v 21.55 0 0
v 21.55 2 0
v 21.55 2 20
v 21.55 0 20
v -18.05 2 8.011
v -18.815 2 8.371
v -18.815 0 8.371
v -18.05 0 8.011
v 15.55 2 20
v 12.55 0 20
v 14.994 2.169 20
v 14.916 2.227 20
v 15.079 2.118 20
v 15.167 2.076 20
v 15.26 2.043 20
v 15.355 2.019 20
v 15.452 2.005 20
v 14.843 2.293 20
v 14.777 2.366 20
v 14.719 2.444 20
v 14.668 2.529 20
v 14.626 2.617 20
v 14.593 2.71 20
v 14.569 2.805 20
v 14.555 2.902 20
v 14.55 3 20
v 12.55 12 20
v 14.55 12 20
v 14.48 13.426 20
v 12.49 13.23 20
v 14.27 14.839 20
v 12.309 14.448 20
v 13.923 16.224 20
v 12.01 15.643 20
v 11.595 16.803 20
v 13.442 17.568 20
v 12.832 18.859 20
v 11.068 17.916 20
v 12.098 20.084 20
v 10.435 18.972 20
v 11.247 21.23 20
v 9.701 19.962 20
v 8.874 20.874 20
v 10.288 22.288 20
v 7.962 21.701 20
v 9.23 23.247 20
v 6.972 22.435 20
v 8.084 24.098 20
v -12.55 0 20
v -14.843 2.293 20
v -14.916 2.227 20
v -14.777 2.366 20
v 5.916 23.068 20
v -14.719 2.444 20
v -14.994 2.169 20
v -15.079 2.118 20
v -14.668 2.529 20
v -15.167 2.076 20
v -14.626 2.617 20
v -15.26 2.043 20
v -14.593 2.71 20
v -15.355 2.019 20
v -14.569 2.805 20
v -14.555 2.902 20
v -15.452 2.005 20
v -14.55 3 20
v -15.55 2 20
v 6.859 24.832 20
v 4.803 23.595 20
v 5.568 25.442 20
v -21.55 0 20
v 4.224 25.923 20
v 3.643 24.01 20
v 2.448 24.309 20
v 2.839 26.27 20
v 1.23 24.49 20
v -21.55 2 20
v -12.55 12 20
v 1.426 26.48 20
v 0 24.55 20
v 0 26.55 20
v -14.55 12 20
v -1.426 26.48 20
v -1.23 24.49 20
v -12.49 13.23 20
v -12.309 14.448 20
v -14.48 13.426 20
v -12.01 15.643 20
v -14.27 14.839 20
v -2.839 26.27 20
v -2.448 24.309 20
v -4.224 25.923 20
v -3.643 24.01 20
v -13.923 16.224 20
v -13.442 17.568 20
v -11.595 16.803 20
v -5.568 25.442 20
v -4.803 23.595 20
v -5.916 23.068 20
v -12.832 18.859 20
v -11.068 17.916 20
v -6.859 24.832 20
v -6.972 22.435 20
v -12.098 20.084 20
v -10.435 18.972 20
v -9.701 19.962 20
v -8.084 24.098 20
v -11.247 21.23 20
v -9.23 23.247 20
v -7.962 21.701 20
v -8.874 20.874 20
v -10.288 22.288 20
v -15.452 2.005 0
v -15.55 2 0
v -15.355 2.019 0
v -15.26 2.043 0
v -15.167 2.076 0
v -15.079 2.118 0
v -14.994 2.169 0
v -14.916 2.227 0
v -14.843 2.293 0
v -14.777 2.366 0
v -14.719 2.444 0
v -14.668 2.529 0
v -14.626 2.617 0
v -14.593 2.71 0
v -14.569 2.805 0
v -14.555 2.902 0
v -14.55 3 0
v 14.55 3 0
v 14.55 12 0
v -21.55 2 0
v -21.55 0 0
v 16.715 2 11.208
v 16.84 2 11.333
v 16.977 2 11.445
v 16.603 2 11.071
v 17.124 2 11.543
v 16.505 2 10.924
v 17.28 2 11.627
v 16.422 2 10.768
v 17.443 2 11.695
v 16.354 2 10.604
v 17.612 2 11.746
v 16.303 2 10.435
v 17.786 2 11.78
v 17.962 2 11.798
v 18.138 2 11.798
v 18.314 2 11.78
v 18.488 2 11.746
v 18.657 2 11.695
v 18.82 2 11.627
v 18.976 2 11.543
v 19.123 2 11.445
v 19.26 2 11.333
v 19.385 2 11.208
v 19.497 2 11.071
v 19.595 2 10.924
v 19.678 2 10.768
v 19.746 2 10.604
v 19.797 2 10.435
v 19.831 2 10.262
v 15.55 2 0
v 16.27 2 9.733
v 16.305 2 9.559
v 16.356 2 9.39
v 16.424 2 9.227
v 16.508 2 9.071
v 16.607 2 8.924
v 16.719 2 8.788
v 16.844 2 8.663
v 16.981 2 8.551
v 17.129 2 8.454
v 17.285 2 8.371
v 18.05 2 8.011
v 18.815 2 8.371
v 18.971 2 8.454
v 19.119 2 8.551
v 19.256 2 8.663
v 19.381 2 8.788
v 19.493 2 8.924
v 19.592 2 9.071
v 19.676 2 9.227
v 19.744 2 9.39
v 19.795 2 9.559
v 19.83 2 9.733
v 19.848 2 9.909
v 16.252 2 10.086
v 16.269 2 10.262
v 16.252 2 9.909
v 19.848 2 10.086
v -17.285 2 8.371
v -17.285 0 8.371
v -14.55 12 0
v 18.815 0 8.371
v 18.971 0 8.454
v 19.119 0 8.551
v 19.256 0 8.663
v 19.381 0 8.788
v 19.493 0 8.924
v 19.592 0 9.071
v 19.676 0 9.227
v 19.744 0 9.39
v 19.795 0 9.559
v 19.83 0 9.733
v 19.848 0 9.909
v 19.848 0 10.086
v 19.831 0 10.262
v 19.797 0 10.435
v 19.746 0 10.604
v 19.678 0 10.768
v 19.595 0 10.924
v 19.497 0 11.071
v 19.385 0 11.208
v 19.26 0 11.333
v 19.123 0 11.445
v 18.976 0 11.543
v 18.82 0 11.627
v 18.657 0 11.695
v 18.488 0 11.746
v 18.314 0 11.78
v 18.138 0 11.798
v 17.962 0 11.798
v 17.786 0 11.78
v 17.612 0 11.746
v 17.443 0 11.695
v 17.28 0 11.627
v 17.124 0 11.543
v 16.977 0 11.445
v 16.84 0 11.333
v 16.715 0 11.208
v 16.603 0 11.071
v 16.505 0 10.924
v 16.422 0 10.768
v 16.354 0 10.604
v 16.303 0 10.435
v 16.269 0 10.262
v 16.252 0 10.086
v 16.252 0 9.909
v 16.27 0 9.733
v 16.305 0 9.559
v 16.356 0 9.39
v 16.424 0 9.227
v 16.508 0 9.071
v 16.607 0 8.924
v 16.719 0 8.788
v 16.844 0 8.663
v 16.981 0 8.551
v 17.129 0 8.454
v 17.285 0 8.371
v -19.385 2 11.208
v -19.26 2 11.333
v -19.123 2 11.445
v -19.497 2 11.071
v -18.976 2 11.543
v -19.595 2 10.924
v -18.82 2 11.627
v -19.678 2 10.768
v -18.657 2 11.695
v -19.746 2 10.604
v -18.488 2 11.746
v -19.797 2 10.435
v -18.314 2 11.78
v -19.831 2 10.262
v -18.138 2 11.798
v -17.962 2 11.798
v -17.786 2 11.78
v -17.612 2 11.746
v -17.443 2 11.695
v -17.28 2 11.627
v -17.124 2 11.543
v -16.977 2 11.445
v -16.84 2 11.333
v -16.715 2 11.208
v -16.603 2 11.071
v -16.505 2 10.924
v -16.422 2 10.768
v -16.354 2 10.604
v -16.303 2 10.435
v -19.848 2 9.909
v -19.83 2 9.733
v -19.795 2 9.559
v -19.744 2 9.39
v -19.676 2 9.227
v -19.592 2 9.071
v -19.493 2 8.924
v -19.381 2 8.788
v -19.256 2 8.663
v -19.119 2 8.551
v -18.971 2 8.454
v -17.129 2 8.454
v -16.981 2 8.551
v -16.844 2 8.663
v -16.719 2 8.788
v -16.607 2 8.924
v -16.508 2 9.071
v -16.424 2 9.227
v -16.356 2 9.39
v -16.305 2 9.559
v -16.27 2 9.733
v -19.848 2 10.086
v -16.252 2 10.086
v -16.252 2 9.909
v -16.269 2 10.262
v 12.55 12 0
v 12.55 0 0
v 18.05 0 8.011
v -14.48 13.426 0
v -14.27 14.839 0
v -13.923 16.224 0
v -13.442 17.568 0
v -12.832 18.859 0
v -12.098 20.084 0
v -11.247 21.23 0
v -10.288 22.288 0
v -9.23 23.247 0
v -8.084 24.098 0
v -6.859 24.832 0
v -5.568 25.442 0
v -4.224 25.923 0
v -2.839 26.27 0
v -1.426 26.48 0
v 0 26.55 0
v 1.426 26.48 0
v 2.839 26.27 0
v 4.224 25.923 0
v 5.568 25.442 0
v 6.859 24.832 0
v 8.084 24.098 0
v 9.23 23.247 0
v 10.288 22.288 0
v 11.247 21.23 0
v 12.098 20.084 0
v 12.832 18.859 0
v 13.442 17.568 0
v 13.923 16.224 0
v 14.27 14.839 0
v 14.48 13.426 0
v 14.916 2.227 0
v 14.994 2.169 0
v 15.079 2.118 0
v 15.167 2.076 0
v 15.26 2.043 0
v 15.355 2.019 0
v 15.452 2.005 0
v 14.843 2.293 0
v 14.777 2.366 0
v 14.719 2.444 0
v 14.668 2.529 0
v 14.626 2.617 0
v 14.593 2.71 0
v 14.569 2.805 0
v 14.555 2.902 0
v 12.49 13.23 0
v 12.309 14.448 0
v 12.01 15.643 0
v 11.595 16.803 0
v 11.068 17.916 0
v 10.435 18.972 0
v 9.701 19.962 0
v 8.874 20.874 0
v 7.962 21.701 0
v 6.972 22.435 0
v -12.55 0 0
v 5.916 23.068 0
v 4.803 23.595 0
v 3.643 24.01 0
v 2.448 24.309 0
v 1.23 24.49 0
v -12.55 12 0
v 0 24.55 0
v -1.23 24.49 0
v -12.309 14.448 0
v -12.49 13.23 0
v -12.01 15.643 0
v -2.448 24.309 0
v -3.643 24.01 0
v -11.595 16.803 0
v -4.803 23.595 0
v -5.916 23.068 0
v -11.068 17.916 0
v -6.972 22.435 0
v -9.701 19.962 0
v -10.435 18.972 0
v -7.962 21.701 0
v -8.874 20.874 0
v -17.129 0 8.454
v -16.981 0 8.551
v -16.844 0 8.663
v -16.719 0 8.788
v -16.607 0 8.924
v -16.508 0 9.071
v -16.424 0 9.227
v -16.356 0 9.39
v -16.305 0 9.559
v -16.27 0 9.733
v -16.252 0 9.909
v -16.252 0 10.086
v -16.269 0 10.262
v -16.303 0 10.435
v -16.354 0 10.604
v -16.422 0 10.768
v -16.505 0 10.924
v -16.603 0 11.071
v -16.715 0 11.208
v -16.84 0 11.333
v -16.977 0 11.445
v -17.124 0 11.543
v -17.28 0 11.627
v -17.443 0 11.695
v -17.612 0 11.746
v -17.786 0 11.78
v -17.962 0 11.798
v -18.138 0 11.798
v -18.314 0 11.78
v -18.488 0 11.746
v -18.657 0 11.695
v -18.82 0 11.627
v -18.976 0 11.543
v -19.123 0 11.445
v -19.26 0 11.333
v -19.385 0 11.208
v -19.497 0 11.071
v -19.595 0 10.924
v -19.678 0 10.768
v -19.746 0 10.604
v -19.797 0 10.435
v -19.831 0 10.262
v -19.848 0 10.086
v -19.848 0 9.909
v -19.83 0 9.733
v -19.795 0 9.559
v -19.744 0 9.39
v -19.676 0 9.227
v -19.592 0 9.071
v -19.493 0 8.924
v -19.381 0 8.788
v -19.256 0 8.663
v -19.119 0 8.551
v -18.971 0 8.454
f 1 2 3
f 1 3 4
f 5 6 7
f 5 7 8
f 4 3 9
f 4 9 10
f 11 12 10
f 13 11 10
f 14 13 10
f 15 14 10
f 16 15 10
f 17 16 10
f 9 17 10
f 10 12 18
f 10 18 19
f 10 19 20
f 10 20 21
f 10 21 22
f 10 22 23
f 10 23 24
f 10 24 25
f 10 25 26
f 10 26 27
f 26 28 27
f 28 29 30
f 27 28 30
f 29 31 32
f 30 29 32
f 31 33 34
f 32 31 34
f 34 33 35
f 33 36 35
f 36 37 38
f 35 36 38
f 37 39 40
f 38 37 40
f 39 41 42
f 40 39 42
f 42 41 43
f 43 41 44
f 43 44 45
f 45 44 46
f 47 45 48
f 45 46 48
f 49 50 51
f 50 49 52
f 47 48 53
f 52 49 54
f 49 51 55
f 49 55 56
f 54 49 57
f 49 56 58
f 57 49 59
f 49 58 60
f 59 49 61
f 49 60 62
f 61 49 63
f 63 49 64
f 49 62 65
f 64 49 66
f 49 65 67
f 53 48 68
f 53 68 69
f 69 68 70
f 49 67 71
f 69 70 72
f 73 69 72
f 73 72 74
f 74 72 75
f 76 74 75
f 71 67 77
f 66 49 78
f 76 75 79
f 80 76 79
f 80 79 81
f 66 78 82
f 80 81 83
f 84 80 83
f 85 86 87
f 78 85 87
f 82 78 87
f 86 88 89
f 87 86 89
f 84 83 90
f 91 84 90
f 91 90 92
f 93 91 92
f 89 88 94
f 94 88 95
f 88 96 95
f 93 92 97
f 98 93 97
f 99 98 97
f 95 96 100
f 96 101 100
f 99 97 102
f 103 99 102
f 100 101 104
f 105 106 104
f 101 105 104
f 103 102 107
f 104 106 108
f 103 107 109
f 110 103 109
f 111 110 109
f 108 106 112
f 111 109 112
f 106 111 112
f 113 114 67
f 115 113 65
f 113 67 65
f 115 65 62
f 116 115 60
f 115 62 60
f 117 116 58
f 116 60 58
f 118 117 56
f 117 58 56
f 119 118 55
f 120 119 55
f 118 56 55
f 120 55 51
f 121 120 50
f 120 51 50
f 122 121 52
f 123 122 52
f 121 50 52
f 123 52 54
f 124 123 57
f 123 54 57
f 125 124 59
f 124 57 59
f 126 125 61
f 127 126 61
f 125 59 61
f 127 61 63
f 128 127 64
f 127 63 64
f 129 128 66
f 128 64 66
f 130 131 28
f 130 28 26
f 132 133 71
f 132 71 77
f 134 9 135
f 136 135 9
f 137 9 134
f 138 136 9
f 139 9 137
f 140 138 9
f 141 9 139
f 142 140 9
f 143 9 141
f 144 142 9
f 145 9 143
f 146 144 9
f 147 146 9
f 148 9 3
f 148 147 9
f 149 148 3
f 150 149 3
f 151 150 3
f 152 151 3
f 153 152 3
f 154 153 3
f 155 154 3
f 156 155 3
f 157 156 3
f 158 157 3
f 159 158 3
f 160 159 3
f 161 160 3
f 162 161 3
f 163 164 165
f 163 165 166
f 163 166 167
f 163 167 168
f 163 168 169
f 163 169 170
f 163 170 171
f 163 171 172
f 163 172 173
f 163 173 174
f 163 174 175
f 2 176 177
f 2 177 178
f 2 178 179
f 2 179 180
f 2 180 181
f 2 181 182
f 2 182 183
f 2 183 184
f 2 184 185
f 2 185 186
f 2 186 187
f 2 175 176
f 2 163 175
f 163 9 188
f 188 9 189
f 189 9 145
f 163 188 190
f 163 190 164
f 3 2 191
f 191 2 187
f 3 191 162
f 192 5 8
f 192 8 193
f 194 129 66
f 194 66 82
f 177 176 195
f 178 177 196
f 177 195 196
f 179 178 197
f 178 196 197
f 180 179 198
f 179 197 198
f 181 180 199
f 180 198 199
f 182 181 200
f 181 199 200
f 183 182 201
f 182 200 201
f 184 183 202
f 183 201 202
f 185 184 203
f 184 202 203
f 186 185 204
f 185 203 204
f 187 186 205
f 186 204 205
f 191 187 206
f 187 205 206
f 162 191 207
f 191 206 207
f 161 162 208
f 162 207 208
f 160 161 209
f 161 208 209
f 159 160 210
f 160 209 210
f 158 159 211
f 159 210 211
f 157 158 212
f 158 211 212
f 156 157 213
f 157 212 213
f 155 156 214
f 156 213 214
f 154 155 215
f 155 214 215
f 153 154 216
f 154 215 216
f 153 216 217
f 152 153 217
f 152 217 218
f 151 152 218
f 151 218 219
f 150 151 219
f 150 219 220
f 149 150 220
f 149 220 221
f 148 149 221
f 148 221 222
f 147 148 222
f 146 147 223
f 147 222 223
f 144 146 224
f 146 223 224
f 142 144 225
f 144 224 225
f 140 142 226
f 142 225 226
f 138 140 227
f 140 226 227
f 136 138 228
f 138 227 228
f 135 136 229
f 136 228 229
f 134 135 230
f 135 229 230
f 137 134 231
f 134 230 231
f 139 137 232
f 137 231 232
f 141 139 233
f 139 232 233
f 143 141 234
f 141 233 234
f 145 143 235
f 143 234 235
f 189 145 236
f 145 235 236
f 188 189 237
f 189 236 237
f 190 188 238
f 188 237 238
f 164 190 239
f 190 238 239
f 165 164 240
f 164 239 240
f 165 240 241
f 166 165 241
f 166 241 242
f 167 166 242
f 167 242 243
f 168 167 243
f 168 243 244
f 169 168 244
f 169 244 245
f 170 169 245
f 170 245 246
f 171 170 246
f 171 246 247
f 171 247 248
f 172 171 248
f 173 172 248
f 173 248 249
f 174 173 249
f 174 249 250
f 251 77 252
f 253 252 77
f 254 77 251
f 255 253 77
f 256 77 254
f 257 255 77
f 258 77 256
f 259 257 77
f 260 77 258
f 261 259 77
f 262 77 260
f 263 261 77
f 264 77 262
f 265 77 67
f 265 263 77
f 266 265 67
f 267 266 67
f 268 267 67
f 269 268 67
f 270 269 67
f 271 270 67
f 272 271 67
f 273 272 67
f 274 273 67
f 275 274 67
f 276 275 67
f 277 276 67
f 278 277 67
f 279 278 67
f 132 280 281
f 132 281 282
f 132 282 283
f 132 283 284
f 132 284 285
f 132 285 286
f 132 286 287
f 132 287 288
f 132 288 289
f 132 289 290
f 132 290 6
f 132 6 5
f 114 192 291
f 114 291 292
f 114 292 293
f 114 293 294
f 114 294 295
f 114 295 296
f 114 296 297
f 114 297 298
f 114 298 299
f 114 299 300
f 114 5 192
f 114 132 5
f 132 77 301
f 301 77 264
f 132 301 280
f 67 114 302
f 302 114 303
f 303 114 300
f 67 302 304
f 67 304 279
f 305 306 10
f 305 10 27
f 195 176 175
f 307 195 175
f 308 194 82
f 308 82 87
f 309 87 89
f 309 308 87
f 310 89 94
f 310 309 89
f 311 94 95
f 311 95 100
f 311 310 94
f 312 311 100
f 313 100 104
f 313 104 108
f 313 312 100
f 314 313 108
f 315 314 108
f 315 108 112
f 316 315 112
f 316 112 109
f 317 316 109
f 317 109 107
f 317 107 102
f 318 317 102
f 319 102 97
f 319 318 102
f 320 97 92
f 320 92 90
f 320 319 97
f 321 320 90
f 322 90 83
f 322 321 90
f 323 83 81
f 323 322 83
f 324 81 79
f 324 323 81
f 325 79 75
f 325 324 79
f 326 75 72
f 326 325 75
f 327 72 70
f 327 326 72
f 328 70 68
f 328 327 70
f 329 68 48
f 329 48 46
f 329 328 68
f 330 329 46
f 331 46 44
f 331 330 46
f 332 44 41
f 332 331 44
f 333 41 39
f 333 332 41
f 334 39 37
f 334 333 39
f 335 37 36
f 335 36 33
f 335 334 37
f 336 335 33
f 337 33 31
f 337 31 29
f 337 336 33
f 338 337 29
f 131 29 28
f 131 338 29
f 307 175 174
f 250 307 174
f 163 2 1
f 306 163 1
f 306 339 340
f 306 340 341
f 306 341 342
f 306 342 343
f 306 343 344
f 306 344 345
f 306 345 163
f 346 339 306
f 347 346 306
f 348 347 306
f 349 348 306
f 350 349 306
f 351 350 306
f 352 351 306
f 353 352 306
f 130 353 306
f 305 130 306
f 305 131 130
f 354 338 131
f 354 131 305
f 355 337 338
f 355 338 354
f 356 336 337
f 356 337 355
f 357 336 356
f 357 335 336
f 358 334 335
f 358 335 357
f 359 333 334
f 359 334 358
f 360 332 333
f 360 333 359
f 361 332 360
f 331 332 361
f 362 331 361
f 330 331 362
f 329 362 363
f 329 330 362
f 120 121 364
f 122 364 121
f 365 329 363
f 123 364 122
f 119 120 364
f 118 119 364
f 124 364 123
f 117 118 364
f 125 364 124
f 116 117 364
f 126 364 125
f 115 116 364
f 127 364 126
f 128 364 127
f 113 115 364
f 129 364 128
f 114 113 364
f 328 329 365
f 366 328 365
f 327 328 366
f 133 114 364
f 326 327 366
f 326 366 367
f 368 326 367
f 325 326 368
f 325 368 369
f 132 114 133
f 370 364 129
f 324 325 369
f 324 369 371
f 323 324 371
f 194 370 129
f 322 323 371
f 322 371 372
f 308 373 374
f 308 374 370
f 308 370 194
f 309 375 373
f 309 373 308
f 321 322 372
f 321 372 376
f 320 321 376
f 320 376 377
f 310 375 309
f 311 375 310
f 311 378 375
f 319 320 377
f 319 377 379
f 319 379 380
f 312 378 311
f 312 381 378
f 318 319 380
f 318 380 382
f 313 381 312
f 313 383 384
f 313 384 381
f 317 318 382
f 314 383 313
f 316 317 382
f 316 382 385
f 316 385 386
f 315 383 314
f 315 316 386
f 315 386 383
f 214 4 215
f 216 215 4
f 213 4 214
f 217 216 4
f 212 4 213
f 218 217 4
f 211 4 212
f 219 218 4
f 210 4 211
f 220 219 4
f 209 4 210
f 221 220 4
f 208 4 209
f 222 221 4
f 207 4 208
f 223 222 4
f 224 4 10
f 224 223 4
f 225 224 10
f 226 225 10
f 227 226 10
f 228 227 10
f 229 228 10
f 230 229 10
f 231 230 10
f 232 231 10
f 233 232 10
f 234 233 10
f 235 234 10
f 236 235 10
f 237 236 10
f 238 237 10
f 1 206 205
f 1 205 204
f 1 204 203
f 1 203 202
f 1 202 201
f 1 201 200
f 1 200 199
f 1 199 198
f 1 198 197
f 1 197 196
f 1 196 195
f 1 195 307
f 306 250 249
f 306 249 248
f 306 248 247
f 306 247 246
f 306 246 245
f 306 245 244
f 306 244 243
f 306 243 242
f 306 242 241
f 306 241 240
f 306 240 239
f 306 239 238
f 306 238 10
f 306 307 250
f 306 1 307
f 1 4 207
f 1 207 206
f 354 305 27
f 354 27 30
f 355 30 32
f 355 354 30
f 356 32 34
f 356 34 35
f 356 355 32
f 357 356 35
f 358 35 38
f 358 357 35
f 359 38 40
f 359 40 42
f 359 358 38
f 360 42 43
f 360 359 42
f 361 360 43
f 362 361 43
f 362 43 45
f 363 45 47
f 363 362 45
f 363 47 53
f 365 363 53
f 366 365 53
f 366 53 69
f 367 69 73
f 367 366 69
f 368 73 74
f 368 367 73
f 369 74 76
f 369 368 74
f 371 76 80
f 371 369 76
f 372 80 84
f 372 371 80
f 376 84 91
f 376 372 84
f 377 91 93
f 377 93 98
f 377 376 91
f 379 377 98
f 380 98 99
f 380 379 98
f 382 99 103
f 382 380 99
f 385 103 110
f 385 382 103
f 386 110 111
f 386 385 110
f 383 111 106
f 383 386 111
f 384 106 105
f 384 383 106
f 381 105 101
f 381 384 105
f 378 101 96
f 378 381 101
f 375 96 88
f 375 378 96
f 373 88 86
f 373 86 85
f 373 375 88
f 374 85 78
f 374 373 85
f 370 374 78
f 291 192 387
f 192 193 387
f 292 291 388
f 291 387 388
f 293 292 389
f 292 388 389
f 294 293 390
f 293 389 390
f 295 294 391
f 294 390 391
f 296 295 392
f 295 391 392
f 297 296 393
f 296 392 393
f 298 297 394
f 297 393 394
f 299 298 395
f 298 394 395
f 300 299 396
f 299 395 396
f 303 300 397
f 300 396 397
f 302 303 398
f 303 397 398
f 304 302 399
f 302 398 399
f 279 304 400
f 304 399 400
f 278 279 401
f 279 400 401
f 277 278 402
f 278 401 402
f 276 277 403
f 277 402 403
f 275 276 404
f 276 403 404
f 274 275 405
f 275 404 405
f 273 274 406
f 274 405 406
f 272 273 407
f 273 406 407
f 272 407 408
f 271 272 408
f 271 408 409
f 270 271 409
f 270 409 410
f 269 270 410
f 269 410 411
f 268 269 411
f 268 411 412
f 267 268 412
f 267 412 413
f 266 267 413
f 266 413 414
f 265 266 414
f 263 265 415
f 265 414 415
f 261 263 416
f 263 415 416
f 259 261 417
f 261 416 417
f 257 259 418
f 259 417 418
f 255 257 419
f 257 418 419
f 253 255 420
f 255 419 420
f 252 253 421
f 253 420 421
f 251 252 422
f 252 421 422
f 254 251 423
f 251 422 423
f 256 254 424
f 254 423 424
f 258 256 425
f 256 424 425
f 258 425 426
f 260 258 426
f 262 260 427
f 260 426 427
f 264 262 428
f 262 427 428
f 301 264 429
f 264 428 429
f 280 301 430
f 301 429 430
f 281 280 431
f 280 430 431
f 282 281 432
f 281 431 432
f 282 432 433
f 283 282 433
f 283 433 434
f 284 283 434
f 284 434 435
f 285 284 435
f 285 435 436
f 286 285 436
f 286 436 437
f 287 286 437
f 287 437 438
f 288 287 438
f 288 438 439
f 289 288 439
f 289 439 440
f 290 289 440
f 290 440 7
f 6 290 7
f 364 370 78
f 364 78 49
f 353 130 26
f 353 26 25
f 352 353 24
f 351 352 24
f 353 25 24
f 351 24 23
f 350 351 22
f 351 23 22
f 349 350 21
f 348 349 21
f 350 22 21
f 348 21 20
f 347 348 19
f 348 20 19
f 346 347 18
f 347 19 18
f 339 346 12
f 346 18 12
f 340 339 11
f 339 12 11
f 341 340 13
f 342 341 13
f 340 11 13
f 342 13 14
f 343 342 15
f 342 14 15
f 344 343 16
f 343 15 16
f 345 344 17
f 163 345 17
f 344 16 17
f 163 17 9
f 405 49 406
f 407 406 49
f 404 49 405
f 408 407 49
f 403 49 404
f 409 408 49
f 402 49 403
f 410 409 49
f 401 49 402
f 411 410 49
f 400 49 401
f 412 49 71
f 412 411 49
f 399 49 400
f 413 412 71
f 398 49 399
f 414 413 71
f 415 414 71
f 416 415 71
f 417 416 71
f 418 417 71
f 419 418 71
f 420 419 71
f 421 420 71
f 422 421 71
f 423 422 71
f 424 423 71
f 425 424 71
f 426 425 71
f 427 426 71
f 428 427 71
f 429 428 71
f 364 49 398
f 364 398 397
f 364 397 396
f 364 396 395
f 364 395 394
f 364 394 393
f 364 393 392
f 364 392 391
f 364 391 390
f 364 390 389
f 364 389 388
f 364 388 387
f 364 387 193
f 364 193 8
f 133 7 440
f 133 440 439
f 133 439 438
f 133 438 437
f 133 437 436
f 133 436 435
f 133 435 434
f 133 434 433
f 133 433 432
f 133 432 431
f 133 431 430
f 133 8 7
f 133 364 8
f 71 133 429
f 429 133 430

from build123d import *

# Parameters (mm, degrees)
SALIENTE_EXTRUIR1_DEPTH      = 20
TALADRO_DE_MARGEN_PARA_M31_D = 3.6
REDONDEO1_R                  = 1
CORTAR_EXTRUIR1_REACH        = 40.303


with BuildPart() as part:
    # Croquis1 → Saliente-Extruir1 (new body)
    with BuildSketch(Plane.XY):
        with BuildLine():
            Line((-12.55, 0), (-21.55, 0))
            Line((-21.55, 0), (-21.55, 2))
            Line((-21.55, 2), (-14.55, 2))
            Line((-14.55, 2), (-14.55, 12))
            ThreePointArc((-14.55, 12), (0, 26.55), (14.55, 12))
            Line((14.55, 12), (14.55, 2))
            Line((14.55, 2), (21.55, 2))
            Line((21.55, 2), (21.55, 0))
            Line((21.55, 0), (12.55, 0))
            Line((12.55, 0), (12.55, 12))
            ThreePointArc((12.55, 12), (0, 24.55), (-12.55, 12))
            Line((-12.55, 12), (-12.55, 0))
        make_face()
    extrude(amount=SALIENTE_EXTRUIR1_DEPTH)

    # Taladro de margen para M31 (through all)
    with Locations(Plane(origin=(0, 2, 0), x_dir=(1, 0, 0), z_dir=(0, 1, 0))):
        with Locations((18.05, -10), (-18.05, -10)):
            Hole(TALADRO_DE_MARGEN_PARA_M31_D / 2)

    # Redondeo1
    redondeo1_edges = [part.edges().sort_by_distance(p)[0] for p in [
        (14.55, 2, 10),
        (-14.55, 2, 10),
    ]]
    fillet(redondeo1_edges, radius=REDONDEO1_R)

    # Croquis4 → Cortar-Extruir1 (cut, up to next)
    with BuildSketch(Plane(origin=(0, 2, 0), x_dir=(1, 0, 0), z_dir=(0, 1, 0)), mode=Mode.PRIVATE) as cortar_extruir1_sk1:
        with BuildLine():
            Line((-18.815101364, -8.370699567), (-18.05, -8.011416474))
            Line((-18.05, -8.011416474), (-17.284898636, -8.370699567))
            ThreePointArc((-17.284898636, -8.370699567), (-18.05, -8.2), (-18.815101364, -8.370699567))
        make_face()
    cortar_extruir1_tool1 = extrude(cortar_extruir1_sk1.sketch, amount=-CORTAR_EXTRUIR1_REACH, mode=Mode.PRIVATE) & part.part
    cortar_extruir1 = cortar_extruir1_tool1.solids().sort_by_distance((-18.05, 2, 8.160025))[0]
    add(cortar_extruir1, mode=Mode.SUBTRACT)

    # Simetría1: Cortar-Extruir1 across plane
    add(cortar_extruir1.mirror(Plane(origin=(0, 0, 0), x_dir=(0, 0, 1), z_dir=(1, 0, 0))), mode=Mode.SUBTRACT)


solid = part.part
